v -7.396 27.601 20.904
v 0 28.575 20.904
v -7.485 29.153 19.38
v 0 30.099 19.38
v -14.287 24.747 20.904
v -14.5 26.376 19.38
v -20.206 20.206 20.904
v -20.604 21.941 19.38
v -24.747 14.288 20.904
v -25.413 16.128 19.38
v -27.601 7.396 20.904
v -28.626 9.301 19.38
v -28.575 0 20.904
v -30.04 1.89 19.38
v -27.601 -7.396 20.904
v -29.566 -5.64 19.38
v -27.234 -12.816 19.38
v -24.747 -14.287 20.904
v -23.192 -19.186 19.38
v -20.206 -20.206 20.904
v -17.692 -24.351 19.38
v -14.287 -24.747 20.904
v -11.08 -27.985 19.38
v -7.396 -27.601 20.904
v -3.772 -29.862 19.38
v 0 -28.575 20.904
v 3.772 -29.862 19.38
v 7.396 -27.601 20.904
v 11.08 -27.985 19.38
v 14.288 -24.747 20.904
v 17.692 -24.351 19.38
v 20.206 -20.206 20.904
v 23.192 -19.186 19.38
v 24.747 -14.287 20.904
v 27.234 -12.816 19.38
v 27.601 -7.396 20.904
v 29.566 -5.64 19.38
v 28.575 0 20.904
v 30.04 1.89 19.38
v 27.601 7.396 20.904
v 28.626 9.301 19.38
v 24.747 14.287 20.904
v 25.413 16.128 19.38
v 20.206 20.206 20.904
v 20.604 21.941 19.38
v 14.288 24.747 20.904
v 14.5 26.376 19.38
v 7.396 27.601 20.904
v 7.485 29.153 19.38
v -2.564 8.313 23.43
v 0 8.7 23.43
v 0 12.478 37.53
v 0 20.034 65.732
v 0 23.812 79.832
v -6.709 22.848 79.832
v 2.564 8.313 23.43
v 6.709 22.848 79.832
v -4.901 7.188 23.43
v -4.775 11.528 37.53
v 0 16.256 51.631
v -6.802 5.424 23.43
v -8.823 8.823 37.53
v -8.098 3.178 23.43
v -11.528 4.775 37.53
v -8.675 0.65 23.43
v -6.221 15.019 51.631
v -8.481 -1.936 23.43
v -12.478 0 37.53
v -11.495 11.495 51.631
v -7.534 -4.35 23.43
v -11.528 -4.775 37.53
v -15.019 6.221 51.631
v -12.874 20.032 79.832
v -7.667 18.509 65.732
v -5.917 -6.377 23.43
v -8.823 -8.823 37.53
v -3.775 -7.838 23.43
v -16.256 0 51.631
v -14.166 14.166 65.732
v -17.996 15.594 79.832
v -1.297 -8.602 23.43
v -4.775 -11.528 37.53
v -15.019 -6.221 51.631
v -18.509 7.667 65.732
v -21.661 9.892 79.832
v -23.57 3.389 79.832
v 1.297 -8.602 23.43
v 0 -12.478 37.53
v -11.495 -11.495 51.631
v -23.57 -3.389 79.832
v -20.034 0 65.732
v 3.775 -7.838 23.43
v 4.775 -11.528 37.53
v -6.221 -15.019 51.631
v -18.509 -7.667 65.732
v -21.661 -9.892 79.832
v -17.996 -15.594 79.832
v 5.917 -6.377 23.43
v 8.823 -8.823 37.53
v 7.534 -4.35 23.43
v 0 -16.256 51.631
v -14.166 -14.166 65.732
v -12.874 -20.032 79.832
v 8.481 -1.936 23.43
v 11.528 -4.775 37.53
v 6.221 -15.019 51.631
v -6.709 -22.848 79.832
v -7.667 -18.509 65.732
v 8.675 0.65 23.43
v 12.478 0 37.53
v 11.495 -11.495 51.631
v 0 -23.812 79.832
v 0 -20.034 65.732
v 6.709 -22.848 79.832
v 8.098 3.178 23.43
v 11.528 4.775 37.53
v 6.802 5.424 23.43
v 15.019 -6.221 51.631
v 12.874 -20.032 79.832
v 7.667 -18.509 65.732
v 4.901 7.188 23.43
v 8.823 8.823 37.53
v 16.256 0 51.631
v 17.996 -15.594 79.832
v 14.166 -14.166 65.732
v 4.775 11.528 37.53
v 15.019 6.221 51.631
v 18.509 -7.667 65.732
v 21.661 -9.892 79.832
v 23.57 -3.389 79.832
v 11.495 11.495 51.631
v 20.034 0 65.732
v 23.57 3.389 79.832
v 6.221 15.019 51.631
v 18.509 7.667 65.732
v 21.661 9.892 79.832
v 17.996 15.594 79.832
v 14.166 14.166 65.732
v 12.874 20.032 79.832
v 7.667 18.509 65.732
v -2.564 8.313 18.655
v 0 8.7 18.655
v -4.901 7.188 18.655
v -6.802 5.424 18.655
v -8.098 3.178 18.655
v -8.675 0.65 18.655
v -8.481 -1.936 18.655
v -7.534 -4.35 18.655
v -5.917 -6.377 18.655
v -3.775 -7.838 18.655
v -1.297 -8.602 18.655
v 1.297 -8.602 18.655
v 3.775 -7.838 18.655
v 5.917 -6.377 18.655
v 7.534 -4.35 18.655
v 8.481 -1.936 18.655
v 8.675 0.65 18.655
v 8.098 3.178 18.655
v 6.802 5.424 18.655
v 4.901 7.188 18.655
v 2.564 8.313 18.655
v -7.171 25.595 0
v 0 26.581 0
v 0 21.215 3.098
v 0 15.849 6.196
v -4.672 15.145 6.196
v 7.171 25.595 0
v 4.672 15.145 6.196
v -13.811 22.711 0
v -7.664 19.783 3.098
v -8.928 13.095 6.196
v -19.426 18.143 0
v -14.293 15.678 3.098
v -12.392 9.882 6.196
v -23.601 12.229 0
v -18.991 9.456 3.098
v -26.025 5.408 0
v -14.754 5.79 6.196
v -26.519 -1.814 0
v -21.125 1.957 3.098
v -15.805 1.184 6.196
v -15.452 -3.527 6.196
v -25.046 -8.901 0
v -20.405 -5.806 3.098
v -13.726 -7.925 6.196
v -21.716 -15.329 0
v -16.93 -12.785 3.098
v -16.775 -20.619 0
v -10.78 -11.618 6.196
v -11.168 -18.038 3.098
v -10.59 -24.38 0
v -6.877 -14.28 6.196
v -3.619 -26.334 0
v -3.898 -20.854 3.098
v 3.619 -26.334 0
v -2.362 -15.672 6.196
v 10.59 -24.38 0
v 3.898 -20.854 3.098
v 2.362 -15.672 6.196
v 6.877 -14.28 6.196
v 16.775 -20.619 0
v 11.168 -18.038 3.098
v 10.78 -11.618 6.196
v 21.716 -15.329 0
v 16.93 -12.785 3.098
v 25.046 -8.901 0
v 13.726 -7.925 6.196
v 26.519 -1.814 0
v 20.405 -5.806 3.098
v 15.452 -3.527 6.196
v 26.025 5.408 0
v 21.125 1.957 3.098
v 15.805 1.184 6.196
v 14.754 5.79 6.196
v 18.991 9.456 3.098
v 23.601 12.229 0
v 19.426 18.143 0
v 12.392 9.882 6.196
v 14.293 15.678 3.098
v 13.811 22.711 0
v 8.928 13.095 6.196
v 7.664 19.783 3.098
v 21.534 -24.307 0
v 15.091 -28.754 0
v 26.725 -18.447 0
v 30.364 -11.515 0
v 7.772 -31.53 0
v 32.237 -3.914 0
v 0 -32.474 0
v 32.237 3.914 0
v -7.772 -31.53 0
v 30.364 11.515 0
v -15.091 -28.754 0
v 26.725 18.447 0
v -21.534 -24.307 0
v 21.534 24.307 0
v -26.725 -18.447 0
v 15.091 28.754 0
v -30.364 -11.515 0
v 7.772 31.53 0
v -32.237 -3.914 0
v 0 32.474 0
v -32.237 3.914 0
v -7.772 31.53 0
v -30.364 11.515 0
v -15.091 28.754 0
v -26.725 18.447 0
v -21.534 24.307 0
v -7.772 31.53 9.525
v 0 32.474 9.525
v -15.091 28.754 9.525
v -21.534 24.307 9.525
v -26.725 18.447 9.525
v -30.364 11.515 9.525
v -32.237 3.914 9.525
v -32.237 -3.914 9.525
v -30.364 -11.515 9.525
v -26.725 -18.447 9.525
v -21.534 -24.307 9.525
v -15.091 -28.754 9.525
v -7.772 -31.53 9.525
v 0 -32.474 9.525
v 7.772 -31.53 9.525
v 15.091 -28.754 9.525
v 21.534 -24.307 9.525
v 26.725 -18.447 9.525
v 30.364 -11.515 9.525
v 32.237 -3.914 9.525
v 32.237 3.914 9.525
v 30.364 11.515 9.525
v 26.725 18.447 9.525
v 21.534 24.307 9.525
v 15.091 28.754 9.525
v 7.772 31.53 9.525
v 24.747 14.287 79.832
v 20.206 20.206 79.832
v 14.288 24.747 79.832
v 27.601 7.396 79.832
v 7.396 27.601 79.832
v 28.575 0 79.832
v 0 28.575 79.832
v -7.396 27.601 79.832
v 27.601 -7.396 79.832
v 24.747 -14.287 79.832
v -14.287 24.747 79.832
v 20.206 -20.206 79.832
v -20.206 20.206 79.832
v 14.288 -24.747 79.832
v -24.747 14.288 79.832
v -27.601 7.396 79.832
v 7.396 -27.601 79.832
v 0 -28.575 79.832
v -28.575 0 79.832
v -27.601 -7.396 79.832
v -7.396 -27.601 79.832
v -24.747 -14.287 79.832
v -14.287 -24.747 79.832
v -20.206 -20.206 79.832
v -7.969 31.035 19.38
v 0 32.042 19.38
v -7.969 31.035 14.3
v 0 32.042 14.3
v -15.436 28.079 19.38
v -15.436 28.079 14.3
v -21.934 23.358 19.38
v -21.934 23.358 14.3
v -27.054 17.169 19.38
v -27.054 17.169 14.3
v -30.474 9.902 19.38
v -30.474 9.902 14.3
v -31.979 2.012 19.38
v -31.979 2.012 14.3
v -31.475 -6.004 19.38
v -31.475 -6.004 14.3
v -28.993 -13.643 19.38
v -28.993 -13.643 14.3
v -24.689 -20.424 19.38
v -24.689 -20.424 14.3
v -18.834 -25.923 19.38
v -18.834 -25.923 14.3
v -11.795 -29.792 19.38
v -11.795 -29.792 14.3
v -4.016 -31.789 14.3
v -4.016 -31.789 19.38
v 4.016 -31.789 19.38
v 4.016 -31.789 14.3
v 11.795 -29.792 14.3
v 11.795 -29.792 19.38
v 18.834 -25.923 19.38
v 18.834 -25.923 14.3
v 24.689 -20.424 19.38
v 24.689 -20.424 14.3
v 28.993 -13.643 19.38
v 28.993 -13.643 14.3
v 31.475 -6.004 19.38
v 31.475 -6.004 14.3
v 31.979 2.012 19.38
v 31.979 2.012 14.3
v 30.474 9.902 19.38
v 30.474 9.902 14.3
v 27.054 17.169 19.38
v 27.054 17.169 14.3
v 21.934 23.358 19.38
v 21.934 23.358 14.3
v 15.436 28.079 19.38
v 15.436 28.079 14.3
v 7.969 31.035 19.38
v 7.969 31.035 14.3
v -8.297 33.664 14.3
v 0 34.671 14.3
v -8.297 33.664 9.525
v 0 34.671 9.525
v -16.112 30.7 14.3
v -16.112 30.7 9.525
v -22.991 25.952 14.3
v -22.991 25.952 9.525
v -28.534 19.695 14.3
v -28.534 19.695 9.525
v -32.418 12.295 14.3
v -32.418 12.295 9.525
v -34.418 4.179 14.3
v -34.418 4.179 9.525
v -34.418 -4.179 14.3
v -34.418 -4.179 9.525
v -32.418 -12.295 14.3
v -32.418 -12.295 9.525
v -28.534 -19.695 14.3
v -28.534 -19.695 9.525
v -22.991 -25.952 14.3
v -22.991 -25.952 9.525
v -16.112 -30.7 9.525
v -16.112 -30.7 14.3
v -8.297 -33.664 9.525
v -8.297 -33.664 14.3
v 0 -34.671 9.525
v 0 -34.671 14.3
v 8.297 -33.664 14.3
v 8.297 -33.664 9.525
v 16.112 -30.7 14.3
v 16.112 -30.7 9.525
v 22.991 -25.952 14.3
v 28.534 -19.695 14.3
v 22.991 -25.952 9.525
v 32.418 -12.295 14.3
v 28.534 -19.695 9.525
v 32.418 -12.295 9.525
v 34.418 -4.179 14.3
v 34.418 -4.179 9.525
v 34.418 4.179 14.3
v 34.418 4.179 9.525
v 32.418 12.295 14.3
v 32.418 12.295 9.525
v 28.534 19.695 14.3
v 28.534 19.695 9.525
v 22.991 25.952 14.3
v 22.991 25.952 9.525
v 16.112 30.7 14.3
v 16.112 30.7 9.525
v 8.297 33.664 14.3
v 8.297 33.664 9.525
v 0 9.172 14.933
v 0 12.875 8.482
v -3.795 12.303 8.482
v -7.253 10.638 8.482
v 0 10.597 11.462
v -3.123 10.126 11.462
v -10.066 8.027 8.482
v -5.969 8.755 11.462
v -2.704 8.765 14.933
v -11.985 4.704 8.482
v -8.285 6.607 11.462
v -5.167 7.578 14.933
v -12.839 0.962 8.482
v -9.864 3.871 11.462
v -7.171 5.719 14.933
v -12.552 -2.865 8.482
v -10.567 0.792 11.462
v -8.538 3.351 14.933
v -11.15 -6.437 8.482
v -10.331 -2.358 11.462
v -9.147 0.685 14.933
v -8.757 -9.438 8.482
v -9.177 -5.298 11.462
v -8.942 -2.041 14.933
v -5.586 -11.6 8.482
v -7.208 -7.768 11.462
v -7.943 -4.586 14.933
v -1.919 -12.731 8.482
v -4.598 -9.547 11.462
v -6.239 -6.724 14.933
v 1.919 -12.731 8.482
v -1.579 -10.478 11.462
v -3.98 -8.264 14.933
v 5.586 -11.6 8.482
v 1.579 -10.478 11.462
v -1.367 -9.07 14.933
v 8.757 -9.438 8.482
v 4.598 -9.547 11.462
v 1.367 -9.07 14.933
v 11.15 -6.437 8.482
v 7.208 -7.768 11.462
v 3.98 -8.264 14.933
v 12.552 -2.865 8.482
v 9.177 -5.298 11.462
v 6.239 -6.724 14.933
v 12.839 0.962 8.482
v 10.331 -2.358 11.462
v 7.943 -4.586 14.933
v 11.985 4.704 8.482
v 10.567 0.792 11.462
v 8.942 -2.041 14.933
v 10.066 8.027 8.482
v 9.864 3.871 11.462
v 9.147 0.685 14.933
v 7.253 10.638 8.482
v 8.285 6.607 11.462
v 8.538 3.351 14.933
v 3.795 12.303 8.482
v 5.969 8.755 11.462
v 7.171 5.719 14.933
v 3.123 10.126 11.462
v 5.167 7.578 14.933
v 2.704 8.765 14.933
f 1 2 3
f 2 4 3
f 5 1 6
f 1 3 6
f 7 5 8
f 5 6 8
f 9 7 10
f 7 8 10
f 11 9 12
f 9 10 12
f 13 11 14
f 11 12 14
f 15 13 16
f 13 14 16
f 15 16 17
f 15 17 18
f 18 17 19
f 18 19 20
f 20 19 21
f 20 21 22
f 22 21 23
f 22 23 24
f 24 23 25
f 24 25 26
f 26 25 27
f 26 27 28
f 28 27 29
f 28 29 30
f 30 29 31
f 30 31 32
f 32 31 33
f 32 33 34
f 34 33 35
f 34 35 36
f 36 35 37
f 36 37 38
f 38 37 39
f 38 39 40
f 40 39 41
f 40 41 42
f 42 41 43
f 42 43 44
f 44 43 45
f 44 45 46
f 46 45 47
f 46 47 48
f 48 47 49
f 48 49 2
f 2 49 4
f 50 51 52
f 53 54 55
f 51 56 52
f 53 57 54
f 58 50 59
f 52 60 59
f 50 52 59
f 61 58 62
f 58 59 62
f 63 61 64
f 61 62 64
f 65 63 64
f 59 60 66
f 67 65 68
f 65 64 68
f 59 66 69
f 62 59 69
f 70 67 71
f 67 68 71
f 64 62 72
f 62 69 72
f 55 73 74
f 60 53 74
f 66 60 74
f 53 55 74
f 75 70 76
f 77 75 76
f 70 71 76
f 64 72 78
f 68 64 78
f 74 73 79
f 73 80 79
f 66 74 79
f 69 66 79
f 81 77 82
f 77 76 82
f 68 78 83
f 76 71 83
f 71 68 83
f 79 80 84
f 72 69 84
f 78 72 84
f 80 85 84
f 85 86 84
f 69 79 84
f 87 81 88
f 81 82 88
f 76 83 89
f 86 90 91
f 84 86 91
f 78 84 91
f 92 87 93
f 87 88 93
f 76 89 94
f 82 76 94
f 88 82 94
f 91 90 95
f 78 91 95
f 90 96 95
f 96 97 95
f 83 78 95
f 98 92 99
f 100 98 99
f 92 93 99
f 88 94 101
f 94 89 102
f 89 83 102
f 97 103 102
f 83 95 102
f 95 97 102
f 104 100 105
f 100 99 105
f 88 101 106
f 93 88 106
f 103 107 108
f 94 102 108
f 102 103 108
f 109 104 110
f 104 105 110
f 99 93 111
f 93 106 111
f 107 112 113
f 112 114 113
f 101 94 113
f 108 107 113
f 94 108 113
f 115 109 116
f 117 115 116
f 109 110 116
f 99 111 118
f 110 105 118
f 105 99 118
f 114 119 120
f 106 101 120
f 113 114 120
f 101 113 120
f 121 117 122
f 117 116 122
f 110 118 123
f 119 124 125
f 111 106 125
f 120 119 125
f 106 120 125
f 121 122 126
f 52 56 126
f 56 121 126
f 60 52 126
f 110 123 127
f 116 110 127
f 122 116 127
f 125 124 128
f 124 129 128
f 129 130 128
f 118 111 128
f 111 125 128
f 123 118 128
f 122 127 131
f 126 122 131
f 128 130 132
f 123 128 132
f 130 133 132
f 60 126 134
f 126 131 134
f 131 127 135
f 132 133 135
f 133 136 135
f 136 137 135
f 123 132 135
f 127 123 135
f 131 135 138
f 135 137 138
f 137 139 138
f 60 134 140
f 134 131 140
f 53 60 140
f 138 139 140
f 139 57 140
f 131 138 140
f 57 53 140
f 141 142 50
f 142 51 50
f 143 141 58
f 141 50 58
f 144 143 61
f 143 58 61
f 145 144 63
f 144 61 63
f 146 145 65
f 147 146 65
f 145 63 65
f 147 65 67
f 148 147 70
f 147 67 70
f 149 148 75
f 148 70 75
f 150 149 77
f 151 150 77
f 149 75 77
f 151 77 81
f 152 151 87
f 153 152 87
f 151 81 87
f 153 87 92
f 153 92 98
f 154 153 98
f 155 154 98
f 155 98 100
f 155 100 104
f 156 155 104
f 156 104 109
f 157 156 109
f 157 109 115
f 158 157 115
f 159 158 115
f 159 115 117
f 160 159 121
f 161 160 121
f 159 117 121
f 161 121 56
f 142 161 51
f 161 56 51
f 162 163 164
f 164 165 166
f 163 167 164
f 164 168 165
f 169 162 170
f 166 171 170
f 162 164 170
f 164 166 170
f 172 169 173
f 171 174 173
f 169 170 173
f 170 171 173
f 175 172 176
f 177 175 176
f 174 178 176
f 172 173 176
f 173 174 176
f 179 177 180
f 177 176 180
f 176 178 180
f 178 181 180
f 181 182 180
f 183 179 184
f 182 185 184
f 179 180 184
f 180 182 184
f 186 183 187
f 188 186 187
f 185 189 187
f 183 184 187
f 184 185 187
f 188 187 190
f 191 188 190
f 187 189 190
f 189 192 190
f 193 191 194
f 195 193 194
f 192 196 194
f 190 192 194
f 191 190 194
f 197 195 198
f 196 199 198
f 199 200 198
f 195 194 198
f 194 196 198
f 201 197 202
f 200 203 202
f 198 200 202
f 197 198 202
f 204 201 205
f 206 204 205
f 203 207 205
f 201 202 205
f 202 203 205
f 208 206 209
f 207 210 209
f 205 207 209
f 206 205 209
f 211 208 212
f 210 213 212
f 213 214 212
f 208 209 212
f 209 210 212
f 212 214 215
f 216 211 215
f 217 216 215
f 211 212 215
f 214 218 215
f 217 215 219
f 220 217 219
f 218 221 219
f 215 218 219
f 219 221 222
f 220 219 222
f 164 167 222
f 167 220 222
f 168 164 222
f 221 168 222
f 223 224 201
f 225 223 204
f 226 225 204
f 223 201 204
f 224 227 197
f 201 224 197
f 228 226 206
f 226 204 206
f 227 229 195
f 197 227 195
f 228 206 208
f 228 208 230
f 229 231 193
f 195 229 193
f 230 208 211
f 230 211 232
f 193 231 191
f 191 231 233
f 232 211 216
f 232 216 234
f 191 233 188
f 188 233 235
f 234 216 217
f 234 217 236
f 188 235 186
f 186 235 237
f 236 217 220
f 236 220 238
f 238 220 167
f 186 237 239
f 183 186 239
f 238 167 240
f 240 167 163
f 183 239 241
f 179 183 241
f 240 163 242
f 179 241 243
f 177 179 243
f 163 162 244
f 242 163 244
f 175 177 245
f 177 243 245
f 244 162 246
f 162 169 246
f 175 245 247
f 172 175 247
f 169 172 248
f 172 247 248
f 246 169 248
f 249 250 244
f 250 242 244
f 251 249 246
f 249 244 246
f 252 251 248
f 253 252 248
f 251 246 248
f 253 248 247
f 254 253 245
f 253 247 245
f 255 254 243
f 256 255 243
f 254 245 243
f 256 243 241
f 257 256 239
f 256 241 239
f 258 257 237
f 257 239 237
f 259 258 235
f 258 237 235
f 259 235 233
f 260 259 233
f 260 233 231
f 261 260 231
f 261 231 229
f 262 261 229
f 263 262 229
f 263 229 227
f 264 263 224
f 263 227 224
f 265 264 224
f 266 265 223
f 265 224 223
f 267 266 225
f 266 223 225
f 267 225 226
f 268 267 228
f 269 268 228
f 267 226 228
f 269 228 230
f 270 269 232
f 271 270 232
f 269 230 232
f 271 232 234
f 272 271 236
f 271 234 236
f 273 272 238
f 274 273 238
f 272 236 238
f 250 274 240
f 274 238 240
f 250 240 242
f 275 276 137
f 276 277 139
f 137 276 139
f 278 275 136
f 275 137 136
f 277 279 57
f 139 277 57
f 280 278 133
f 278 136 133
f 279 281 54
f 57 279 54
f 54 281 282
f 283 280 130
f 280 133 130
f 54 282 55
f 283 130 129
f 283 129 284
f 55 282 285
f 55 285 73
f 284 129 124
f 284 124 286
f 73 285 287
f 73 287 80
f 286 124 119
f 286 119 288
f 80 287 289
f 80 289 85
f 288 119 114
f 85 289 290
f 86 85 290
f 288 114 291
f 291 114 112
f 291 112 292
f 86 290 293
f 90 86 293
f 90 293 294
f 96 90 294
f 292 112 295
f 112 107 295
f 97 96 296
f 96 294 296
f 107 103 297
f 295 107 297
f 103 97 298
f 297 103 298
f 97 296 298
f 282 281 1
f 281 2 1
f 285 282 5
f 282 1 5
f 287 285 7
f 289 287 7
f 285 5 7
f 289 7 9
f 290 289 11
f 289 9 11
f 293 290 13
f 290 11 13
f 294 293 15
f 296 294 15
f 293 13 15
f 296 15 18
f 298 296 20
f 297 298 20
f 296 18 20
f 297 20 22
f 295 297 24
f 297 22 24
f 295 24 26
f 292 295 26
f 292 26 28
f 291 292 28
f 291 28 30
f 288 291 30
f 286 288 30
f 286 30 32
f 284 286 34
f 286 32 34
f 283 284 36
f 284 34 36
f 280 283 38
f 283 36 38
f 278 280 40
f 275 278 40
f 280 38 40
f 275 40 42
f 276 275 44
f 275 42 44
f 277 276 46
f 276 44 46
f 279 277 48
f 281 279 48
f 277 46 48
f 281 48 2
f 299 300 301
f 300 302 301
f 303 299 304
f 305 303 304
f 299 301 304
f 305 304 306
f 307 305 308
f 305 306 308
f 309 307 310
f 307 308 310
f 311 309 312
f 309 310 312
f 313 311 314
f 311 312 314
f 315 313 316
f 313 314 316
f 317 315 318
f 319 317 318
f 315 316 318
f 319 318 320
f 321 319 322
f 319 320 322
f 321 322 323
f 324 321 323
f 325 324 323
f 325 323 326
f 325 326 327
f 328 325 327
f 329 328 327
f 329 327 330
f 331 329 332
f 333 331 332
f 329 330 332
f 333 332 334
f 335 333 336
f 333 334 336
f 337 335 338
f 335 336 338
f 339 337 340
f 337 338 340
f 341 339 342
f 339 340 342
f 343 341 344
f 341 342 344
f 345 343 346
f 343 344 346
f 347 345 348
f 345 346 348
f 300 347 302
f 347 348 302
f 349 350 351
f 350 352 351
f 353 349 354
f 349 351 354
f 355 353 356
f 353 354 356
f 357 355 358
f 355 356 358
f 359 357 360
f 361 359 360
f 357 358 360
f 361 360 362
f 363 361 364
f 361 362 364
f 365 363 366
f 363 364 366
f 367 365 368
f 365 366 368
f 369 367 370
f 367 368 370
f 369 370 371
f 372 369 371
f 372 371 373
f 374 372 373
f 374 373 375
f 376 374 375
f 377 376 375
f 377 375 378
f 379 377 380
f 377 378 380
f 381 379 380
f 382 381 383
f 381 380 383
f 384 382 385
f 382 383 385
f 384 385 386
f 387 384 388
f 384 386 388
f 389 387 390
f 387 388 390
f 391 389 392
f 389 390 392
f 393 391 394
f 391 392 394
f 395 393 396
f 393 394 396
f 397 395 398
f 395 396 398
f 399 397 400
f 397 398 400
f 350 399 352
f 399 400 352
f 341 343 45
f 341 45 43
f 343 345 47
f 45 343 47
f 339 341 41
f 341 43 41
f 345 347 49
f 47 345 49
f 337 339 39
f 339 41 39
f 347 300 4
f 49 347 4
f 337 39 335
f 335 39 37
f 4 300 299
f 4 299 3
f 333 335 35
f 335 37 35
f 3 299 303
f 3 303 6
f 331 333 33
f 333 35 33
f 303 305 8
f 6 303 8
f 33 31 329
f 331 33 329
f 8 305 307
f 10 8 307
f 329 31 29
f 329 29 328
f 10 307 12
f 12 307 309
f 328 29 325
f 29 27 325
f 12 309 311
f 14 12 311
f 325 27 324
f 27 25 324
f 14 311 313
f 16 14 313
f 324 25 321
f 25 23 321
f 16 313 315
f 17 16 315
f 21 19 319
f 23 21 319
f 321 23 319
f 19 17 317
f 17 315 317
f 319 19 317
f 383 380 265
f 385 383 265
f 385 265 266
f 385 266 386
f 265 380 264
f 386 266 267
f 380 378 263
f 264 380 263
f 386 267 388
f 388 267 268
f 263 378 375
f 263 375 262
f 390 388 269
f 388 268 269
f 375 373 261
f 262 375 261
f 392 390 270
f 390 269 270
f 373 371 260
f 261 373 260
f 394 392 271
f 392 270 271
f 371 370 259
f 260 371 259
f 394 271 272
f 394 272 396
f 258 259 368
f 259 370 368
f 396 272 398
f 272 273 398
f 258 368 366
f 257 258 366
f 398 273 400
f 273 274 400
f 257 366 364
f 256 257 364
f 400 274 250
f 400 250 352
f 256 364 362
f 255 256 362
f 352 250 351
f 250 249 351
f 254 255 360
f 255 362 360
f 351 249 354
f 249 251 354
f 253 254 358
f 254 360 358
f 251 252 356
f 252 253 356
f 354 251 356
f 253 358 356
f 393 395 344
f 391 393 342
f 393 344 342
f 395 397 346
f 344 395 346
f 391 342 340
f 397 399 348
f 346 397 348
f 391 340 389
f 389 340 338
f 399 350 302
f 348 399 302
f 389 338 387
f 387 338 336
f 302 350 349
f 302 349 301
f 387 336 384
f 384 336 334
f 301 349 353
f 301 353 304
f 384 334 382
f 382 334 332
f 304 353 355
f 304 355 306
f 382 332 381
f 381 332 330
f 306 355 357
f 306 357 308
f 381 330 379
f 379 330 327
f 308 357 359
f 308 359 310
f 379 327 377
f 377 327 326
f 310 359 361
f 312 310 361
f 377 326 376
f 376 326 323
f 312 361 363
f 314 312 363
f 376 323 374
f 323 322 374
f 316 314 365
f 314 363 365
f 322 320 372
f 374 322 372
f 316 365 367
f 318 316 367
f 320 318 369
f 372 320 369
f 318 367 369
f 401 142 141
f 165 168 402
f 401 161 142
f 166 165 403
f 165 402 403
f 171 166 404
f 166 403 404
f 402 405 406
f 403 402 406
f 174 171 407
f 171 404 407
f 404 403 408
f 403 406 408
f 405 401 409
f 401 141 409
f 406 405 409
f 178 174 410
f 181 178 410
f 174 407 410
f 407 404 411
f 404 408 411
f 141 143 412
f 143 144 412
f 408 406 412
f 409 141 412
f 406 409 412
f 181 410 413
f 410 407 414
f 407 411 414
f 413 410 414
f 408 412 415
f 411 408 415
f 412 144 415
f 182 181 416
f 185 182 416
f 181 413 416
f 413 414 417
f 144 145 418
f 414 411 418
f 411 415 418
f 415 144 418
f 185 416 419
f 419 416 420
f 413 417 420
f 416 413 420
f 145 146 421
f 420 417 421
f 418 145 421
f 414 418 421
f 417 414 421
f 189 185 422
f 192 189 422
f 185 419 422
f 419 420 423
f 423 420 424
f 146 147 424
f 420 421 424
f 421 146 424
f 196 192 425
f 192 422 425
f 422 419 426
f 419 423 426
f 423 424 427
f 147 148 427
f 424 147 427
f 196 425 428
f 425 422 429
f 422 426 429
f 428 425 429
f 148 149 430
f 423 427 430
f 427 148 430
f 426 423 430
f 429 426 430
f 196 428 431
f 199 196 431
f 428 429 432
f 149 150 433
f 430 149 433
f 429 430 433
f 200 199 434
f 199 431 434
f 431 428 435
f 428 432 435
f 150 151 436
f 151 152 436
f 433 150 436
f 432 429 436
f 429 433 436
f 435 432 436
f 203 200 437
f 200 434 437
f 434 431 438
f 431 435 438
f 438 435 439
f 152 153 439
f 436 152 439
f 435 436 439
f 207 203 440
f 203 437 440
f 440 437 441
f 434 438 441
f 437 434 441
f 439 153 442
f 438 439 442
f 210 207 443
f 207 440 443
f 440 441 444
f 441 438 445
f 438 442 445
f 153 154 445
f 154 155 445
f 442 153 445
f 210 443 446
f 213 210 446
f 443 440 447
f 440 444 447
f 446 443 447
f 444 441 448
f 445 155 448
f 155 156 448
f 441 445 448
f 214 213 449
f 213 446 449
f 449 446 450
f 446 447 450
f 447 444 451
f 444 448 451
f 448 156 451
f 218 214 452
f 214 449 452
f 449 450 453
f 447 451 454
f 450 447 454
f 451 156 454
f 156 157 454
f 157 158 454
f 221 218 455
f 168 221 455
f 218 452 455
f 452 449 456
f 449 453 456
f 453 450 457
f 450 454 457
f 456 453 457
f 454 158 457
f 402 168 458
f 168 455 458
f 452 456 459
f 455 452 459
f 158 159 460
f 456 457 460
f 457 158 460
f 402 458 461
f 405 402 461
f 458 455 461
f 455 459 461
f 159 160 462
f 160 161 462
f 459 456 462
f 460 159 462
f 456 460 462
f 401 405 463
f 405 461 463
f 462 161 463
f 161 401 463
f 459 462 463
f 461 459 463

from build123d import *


with BuildPart() as part:
    # Sketch1 → Revolve1 (revolve)
    with BuildSketch(Plane(origin=(0, 0, 0), x_dir=(0, 0, -1), z_dir=(1, 0, 0))):
        with BuildLine():
            Line((-79.8322, 28.575), (-20.9042, 28.575))
            Line((-20.9042, 28.575), (-19.3802, 30.099))
            Line((-19.3802, 30.099), (-19.3802, 32.0421))
            Line((-19.3802, 32.0421), (-14.3002, 32.0421))
            Line((-14.3002, 32.0421), (-14.3002, 34.671))
            Line((-14.3002, 34.671), (-9.525, 34.671))
            Line((-9.525, 34.671), (-9.525, 32.4739))
            Line((-9.525, 32.4739), (0, 32.4739))
            Line((0, 32.4739), (0, 26.5811))
            Line((0, 26.5811), (-6.195945658, 15.84940732))
            ThreePointArc((-6.195945658, 15.84940732), (-11.462350599, 10.596653993), (-18.654516145, 8.6995))
            Line((-18.654516145, 8.6995), (-23.429716145, 8.6995))
            Line((-23.429716145, 8.6995), (-79.8322, 23.8125))
            Line((-79.8322, 23.8125), (-79.8322, 28.575))
        make_face()
    revolve(axis=Axis((0, 0, 0), (0, 0, 1)))


solid = part.part
